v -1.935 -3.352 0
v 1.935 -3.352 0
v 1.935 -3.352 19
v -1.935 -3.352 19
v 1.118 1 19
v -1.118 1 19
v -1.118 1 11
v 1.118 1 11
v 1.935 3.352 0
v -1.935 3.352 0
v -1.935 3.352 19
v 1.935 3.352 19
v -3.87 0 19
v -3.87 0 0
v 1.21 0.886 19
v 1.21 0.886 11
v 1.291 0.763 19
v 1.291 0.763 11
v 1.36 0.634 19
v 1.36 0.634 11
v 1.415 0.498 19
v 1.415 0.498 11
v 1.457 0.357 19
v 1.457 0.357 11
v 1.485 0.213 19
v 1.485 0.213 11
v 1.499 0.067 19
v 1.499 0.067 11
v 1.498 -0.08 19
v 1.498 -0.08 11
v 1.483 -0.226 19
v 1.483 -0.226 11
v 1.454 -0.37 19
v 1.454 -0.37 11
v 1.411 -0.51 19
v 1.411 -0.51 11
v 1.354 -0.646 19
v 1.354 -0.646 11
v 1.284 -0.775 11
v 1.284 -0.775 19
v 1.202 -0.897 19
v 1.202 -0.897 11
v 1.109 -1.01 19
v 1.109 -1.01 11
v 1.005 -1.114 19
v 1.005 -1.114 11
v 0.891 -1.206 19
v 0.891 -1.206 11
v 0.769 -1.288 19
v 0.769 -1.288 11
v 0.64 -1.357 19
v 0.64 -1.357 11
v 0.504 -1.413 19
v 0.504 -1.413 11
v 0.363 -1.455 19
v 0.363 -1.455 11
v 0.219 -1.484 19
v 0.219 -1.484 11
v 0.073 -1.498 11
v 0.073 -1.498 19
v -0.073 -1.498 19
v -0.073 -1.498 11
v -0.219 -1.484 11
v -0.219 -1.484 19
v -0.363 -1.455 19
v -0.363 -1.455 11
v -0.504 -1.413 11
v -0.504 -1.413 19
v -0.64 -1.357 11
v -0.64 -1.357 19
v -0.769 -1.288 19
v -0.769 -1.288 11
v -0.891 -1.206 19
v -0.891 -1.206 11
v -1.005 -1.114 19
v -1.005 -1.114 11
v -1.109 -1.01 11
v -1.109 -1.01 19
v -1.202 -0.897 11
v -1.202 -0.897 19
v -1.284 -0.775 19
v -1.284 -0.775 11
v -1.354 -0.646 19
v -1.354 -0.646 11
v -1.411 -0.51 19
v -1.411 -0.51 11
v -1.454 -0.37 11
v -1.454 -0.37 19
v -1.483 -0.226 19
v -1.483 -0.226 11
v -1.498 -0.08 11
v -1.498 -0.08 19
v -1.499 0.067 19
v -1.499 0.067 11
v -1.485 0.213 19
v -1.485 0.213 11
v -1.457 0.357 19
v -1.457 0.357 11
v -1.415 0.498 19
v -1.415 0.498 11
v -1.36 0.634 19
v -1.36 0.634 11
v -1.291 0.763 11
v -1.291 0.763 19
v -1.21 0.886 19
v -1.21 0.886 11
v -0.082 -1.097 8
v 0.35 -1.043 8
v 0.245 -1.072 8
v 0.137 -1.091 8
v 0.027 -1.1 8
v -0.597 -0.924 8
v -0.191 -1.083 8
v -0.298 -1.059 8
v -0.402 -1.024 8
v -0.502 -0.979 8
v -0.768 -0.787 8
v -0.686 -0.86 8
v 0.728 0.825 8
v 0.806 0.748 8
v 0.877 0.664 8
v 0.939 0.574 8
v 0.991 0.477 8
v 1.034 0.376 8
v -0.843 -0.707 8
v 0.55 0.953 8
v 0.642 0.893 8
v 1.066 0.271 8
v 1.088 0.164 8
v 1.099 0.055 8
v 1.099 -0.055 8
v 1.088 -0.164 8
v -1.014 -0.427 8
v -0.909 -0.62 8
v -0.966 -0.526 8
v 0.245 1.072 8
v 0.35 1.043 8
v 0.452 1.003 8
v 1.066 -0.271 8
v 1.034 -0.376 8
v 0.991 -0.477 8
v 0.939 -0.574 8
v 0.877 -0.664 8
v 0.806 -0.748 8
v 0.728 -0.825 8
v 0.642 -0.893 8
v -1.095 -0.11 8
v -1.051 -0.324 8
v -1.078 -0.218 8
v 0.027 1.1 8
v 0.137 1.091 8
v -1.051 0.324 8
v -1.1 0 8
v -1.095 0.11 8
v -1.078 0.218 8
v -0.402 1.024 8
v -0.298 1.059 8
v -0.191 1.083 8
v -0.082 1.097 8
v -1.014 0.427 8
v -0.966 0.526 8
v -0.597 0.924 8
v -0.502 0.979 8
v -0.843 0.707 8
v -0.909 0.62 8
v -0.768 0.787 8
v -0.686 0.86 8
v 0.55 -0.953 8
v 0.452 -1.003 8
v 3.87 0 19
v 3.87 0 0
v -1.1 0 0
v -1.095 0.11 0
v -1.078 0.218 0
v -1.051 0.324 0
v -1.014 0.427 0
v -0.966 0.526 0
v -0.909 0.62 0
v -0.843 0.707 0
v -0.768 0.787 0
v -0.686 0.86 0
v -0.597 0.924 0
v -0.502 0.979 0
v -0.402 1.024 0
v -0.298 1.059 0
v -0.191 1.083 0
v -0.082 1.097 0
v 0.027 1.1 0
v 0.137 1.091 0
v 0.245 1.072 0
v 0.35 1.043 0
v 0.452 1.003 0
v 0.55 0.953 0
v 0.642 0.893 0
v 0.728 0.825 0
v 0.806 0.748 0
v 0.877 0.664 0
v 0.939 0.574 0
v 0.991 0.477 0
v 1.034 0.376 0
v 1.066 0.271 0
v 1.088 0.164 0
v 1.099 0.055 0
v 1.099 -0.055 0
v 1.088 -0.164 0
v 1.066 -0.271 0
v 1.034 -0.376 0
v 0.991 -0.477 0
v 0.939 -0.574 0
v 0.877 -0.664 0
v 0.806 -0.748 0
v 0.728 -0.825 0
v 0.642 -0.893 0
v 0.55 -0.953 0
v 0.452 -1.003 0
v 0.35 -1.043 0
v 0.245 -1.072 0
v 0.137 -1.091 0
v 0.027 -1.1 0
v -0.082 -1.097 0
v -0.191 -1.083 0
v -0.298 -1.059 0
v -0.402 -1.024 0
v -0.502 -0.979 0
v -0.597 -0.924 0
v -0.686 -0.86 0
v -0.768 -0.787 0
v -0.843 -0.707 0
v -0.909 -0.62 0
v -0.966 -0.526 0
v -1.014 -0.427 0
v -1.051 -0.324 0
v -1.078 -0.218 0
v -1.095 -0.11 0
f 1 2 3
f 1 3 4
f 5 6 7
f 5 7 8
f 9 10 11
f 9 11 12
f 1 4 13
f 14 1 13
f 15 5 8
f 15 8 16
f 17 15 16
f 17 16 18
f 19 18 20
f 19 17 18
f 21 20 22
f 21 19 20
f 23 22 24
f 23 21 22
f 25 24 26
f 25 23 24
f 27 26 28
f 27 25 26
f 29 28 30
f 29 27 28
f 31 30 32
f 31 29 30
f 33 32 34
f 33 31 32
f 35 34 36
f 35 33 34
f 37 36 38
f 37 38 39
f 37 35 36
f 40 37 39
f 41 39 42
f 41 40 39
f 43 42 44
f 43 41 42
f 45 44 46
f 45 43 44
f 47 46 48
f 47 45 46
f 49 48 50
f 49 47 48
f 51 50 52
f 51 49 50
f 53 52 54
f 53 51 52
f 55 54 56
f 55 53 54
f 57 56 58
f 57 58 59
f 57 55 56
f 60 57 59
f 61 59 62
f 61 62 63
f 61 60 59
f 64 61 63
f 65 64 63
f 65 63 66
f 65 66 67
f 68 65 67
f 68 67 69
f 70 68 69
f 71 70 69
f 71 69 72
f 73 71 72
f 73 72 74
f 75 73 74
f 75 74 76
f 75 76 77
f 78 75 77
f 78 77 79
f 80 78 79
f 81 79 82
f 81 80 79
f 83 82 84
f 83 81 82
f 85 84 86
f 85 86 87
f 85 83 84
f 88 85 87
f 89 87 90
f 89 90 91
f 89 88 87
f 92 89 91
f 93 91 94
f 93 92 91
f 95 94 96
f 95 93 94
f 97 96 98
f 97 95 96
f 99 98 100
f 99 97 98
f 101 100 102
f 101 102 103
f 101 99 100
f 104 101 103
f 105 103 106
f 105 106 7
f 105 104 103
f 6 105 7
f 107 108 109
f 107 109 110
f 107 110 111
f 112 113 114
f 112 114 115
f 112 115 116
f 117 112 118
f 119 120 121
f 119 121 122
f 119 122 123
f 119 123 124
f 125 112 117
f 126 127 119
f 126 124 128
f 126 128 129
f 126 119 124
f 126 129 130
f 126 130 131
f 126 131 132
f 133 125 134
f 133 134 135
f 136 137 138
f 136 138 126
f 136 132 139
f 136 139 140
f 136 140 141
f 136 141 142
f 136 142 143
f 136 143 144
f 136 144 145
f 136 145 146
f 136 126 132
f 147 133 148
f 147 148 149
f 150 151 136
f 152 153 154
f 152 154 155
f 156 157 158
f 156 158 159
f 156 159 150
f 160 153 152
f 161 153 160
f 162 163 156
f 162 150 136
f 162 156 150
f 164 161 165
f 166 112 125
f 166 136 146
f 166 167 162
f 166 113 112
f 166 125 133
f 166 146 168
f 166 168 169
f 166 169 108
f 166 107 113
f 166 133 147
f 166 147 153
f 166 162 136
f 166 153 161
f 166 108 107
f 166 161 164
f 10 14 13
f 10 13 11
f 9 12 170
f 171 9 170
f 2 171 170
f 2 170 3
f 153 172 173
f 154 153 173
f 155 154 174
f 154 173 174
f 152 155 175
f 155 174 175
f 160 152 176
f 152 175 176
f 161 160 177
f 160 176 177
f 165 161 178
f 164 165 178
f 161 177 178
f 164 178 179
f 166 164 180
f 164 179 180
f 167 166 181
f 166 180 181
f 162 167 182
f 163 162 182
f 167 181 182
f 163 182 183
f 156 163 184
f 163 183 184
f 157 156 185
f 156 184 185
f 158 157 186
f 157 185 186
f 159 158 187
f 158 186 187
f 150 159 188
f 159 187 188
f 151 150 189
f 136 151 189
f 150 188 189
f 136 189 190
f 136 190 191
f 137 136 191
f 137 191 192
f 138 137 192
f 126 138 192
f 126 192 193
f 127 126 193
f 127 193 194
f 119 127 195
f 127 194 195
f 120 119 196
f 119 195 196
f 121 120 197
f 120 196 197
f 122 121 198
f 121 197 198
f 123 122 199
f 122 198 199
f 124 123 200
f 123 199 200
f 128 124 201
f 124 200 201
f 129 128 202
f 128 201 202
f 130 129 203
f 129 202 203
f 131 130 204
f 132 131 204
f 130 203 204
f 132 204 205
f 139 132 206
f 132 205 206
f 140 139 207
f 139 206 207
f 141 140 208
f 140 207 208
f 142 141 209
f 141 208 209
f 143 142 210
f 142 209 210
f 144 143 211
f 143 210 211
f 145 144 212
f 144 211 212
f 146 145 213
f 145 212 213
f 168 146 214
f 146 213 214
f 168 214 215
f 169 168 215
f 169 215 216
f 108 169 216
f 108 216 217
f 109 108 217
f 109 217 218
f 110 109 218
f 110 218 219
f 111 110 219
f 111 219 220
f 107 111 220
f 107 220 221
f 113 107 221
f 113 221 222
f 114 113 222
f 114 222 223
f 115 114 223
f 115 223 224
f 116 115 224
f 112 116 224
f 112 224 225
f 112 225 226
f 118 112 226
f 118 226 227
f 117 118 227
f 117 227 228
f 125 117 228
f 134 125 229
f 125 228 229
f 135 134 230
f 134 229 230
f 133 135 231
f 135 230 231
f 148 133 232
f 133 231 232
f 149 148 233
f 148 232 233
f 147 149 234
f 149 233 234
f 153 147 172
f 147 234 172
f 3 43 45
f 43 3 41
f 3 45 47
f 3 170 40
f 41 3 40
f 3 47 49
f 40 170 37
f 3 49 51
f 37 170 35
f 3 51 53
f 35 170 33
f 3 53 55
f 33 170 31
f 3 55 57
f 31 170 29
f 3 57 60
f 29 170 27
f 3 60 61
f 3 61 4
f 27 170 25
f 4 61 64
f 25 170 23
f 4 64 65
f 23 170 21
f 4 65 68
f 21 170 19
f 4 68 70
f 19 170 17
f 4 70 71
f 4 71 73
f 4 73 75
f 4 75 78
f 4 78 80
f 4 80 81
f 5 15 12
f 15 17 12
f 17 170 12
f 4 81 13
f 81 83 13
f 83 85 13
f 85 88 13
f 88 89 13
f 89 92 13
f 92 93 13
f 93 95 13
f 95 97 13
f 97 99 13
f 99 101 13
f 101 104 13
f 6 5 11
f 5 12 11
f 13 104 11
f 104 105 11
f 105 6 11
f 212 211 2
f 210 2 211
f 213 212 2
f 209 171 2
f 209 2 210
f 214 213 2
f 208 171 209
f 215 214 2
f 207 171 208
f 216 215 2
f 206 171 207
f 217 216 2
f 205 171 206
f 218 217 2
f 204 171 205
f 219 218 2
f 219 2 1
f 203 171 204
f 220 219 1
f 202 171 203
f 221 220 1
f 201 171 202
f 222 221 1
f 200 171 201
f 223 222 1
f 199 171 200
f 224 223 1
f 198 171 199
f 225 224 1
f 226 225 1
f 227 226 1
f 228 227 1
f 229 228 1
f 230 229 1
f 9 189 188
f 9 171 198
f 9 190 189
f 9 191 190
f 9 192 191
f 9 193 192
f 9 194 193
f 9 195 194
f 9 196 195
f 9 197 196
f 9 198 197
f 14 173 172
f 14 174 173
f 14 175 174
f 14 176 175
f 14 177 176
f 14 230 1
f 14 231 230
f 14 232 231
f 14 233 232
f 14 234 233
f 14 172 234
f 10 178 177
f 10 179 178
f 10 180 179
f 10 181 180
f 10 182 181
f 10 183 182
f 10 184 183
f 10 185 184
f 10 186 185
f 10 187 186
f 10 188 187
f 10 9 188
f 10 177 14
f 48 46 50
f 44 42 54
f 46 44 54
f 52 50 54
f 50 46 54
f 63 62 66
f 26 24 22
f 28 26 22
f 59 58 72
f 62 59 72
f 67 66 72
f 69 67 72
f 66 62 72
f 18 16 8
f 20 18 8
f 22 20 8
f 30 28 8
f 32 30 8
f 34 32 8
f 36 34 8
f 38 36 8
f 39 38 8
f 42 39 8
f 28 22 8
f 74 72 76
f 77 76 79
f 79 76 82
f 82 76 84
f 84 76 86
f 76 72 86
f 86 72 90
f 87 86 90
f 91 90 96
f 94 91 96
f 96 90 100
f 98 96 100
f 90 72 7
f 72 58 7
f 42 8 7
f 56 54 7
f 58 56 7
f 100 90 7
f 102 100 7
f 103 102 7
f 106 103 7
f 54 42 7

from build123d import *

# Parameters (mm, degrees)
EXTRUDE_1_DEPTH     = 19
CUT_EXTRUDE_1_DEPTH = 8
SKETCH_3_R          = 1.1
CUT_EXTRUDE_2_DEPTH = 8


with BuildPart() as part:
    # 草图1 → 凸台-拉伸1 (new body)
    with BuildSketch(Plane.XY):
        Polygon((-1.935, 3.351518313), (1.935, 3.351518313), (3.87, 0), (1.935, -3.351518313), (-1.935, -3.351518313), (-3.87, 0), align=None)
    extrude(amount=EXTRUDE_1_DEPTH)

    # 草图2 → 切除-拉伸1 (cut)
    with BuildSketch(Plane.XY.offset(19)):
        with BuildLine():
            Line((-1.118033989, 1), (1.118033989, 1))
            ThreePointArc((1.118033989, 1), (0, -1.5), (-1.118033989, 1))
        make_face()
    extrude(amount=-CUT_EXTRUDE_1_DEPTH, mode=Mode.SUBTRACT)

    # 草图3 → 切除-拉伸2 (cut)
    with BuildSketch(Plane(origin=(0, 0, 0), x_dir=(-1, 0, 0), z_dir=(0, 0, -1))):
        Circle(SKETCH_3_R)
    extrude(amount=-CUT_EXTRUDE_2_DEPTH, mode=Mode.SUBTRACT)


solid = part.part
